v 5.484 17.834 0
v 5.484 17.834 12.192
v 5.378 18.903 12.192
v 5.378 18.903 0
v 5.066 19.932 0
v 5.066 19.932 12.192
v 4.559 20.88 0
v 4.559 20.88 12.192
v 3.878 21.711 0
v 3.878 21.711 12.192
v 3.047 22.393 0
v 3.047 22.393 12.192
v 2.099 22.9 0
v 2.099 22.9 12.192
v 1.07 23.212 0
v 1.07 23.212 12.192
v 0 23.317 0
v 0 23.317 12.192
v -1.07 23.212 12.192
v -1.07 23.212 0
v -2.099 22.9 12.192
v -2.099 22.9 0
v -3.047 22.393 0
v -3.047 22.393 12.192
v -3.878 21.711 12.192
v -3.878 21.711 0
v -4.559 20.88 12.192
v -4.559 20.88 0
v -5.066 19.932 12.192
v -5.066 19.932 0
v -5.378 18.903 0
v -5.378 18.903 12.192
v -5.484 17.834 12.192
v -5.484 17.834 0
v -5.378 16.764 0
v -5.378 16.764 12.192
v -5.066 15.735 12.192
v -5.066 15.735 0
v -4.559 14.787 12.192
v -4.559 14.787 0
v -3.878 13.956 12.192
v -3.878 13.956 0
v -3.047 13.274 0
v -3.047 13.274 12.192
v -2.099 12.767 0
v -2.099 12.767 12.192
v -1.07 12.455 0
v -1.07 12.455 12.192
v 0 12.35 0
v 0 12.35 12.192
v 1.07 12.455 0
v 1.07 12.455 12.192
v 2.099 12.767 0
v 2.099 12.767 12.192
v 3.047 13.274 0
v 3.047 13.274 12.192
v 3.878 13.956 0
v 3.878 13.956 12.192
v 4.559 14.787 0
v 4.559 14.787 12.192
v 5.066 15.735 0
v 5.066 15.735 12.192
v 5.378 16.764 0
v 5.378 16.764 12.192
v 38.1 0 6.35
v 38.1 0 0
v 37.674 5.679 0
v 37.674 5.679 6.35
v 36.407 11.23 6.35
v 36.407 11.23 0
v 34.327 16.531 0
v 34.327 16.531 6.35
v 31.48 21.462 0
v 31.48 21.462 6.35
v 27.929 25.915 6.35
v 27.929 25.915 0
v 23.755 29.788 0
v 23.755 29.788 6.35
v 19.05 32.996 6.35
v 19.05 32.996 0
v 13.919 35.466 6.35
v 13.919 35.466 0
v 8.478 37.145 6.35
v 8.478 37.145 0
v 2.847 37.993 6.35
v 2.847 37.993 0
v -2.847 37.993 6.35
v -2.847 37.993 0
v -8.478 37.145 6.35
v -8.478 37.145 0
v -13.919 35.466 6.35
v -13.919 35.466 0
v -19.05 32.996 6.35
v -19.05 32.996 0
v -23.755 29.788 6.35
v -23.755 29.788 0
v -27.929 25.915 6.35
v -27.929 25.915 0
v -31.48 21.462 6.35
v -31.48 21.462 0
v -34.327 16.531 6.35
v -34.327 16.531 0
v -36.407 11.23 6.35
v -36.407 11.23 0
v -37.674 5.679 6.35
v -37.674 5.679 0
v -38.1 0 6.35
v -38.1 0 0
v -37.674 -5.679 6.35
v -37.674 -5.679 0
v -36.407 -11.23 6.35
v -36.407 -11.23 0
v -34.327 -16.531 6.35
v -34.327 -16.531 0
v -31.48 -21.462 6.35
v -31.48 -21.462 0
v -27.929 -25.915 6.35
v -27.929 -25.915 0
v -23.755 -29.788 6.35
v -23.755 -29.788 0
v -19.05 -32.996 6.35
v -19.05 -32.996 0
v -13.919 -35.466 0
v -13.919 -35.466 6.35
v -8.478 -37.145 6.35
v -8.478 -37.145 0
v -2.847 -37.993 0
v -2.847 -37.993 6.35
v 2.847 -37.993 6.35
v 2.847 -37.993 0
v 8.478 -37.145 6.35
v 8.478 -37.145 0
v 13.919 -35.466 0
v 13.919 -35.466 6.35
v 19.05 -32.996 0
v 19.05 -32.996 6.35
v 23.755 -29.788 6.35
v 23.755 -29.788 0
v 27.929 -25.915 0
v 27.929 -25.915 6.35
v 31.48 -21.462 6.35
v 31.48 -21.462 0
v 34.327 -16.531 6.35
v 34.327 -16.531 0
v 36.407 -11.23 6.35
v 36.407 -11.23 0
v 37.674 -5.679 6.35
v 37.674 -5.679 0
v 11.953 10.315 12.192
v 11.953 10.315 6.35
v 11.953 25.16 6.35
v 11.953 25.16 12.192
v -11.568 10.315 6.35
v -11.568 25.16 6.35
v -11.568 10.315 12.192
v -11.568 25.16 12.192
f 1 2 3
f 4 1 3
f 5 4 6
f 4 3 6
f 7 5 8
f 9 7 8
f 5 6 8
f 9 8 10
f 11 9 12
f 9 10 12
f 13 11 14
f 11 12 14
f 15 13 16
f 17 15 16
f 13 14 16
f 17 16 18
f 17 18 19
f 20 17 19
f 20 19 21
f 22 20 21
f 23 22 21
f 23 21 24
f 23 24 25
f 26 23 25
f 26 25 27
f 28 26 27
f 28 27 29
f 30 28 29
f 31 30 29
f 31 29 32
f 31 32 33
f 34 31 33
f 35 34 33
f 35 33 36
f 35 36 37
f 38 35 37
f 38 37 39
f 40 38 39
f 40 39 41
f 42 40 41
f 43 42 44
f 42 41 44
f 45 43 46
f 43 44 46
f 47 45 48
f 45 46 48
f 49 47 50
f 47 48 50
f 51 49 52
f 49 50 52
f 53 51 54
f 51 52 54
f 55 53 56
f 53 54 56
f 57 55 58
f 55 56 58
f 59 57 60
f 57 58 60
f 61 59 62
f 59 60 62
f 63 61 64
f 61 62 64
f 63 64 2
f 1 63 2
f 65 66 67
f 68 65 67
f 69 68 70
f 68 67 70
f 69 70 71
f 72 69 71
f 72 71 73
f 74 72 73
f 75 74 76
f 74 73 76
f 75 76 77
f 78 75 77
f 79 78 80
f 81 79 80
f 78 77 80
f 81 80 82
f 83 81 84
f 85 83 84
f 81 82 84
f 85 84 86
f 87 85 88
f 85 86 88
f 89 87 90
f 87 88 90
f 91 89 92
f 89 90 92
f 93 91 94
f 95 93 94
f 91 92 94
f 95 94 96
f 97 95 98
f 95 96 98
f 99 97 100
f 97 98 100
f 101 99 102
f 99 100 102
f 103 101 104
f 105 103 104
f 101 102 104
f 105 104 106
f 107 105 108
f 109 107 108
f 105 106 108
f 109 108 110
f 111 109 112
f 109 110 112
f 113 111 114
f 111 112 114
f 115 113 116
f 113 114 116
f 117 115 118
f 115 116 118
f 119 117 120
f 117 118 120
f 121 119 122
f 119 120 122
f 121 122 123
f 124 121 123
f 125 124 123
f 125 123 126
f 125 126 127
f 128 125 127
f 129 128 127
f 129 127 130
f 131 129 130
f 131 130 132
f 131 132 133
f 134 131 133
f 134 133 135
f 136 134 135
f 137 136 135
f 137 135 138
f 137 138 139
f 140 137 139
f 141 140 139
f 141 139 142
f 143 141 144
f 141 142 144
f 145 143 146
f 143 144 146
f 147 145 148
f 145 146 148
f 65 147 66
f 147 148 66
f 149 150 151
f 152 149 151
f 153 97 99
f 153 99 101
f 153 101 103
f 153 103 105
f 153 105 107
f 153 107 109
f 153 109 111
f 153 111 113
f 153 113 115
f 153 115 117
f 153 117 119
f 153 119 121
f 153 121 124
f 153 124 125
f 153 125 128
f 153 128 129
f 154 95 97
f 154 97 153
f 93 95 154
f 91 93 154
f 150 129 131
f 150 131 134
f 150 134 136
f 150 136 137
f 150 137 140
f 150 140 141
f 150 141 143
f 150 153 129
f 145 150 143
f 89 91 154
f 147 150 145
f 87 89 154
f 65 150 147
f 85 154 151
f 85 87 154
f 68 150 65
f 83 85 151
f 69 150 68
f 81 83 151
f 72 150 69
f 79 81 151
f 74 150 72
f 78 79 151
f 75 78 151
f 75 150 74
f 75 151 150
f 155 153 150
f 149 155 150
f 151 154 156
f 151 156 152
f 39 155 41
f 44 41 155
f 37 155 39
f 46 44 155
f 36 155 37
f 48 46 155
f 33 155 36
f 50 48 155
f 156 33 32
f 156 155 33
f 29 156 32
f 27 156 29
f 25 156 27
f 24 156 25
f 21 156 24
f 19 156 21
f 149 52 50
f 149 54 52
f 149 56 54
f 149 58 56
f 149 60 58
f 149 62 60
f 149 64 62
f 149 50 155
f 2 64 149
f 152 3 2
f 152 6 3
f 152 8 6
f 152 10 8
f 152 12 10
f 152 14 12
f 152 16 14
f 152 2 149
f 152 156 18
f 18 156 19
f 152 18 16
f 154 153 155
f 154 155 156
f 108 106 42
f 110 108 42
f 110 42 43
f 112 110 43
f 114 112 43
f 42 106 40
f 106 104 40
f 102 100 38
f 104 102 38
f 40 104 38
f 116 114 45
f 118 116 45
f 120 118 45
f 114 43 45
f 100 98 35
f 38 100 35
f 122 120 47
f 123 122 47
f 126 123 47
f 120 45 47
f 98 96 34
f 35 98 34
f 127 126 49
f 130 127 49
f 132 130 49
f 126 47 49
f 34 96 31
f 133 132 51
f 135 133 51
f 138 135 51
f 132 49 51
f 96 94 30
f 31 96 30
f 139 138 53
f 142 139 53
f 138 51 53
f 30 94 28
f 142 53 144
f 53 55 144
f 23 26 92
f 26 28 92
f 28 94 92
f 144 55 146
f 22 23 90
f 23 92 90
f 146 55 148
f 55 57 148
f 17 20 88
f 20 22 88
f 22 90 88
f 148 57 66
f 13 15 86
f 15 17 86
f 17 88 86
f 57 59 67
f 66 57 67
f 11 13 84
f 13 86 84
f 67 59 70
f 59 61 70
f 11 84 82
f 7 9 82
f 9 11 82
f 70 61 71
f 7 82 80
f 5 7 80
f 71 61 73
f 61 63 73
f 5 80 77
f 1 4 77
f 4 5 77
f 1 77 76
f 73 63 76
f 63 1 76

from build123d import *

# Parameters (mm, degrees)
F0_R     = 38.1
F1_DEPTH = 6.35
F2_W     = 23.521014
F2_H     = 14.845229
F3_DEPTH = 5.842
F4_R     = 5.483658
F5_DEPTH = 27.94


with BuildPart() as f1:
    # F0 (on Top) → F1 (new body)
    with BuildSketch(Plane.XY):
        Circle(F0_R)
    extrude(amount=F1_DEPTH)

    # F2 (on face) → F3 (join)
    with BuildSketch(Plane.XY.offset(6.35)):
        with Locations((0.192795, 17.737156)):
            Rectangle(F2_W, F2_H)
    extrude(amount=F3_DEPTH)

    # F4 (on face) → F5 (cut)
    with BuildSketch(Plane.XY.offset(12.192)):
        with Locations((0, 17.833555)):
            Circle(F4_R)
    extrude(amount=-F5_DEPTH, mode=Mode.SUBTRACT)


solid = f1.part
